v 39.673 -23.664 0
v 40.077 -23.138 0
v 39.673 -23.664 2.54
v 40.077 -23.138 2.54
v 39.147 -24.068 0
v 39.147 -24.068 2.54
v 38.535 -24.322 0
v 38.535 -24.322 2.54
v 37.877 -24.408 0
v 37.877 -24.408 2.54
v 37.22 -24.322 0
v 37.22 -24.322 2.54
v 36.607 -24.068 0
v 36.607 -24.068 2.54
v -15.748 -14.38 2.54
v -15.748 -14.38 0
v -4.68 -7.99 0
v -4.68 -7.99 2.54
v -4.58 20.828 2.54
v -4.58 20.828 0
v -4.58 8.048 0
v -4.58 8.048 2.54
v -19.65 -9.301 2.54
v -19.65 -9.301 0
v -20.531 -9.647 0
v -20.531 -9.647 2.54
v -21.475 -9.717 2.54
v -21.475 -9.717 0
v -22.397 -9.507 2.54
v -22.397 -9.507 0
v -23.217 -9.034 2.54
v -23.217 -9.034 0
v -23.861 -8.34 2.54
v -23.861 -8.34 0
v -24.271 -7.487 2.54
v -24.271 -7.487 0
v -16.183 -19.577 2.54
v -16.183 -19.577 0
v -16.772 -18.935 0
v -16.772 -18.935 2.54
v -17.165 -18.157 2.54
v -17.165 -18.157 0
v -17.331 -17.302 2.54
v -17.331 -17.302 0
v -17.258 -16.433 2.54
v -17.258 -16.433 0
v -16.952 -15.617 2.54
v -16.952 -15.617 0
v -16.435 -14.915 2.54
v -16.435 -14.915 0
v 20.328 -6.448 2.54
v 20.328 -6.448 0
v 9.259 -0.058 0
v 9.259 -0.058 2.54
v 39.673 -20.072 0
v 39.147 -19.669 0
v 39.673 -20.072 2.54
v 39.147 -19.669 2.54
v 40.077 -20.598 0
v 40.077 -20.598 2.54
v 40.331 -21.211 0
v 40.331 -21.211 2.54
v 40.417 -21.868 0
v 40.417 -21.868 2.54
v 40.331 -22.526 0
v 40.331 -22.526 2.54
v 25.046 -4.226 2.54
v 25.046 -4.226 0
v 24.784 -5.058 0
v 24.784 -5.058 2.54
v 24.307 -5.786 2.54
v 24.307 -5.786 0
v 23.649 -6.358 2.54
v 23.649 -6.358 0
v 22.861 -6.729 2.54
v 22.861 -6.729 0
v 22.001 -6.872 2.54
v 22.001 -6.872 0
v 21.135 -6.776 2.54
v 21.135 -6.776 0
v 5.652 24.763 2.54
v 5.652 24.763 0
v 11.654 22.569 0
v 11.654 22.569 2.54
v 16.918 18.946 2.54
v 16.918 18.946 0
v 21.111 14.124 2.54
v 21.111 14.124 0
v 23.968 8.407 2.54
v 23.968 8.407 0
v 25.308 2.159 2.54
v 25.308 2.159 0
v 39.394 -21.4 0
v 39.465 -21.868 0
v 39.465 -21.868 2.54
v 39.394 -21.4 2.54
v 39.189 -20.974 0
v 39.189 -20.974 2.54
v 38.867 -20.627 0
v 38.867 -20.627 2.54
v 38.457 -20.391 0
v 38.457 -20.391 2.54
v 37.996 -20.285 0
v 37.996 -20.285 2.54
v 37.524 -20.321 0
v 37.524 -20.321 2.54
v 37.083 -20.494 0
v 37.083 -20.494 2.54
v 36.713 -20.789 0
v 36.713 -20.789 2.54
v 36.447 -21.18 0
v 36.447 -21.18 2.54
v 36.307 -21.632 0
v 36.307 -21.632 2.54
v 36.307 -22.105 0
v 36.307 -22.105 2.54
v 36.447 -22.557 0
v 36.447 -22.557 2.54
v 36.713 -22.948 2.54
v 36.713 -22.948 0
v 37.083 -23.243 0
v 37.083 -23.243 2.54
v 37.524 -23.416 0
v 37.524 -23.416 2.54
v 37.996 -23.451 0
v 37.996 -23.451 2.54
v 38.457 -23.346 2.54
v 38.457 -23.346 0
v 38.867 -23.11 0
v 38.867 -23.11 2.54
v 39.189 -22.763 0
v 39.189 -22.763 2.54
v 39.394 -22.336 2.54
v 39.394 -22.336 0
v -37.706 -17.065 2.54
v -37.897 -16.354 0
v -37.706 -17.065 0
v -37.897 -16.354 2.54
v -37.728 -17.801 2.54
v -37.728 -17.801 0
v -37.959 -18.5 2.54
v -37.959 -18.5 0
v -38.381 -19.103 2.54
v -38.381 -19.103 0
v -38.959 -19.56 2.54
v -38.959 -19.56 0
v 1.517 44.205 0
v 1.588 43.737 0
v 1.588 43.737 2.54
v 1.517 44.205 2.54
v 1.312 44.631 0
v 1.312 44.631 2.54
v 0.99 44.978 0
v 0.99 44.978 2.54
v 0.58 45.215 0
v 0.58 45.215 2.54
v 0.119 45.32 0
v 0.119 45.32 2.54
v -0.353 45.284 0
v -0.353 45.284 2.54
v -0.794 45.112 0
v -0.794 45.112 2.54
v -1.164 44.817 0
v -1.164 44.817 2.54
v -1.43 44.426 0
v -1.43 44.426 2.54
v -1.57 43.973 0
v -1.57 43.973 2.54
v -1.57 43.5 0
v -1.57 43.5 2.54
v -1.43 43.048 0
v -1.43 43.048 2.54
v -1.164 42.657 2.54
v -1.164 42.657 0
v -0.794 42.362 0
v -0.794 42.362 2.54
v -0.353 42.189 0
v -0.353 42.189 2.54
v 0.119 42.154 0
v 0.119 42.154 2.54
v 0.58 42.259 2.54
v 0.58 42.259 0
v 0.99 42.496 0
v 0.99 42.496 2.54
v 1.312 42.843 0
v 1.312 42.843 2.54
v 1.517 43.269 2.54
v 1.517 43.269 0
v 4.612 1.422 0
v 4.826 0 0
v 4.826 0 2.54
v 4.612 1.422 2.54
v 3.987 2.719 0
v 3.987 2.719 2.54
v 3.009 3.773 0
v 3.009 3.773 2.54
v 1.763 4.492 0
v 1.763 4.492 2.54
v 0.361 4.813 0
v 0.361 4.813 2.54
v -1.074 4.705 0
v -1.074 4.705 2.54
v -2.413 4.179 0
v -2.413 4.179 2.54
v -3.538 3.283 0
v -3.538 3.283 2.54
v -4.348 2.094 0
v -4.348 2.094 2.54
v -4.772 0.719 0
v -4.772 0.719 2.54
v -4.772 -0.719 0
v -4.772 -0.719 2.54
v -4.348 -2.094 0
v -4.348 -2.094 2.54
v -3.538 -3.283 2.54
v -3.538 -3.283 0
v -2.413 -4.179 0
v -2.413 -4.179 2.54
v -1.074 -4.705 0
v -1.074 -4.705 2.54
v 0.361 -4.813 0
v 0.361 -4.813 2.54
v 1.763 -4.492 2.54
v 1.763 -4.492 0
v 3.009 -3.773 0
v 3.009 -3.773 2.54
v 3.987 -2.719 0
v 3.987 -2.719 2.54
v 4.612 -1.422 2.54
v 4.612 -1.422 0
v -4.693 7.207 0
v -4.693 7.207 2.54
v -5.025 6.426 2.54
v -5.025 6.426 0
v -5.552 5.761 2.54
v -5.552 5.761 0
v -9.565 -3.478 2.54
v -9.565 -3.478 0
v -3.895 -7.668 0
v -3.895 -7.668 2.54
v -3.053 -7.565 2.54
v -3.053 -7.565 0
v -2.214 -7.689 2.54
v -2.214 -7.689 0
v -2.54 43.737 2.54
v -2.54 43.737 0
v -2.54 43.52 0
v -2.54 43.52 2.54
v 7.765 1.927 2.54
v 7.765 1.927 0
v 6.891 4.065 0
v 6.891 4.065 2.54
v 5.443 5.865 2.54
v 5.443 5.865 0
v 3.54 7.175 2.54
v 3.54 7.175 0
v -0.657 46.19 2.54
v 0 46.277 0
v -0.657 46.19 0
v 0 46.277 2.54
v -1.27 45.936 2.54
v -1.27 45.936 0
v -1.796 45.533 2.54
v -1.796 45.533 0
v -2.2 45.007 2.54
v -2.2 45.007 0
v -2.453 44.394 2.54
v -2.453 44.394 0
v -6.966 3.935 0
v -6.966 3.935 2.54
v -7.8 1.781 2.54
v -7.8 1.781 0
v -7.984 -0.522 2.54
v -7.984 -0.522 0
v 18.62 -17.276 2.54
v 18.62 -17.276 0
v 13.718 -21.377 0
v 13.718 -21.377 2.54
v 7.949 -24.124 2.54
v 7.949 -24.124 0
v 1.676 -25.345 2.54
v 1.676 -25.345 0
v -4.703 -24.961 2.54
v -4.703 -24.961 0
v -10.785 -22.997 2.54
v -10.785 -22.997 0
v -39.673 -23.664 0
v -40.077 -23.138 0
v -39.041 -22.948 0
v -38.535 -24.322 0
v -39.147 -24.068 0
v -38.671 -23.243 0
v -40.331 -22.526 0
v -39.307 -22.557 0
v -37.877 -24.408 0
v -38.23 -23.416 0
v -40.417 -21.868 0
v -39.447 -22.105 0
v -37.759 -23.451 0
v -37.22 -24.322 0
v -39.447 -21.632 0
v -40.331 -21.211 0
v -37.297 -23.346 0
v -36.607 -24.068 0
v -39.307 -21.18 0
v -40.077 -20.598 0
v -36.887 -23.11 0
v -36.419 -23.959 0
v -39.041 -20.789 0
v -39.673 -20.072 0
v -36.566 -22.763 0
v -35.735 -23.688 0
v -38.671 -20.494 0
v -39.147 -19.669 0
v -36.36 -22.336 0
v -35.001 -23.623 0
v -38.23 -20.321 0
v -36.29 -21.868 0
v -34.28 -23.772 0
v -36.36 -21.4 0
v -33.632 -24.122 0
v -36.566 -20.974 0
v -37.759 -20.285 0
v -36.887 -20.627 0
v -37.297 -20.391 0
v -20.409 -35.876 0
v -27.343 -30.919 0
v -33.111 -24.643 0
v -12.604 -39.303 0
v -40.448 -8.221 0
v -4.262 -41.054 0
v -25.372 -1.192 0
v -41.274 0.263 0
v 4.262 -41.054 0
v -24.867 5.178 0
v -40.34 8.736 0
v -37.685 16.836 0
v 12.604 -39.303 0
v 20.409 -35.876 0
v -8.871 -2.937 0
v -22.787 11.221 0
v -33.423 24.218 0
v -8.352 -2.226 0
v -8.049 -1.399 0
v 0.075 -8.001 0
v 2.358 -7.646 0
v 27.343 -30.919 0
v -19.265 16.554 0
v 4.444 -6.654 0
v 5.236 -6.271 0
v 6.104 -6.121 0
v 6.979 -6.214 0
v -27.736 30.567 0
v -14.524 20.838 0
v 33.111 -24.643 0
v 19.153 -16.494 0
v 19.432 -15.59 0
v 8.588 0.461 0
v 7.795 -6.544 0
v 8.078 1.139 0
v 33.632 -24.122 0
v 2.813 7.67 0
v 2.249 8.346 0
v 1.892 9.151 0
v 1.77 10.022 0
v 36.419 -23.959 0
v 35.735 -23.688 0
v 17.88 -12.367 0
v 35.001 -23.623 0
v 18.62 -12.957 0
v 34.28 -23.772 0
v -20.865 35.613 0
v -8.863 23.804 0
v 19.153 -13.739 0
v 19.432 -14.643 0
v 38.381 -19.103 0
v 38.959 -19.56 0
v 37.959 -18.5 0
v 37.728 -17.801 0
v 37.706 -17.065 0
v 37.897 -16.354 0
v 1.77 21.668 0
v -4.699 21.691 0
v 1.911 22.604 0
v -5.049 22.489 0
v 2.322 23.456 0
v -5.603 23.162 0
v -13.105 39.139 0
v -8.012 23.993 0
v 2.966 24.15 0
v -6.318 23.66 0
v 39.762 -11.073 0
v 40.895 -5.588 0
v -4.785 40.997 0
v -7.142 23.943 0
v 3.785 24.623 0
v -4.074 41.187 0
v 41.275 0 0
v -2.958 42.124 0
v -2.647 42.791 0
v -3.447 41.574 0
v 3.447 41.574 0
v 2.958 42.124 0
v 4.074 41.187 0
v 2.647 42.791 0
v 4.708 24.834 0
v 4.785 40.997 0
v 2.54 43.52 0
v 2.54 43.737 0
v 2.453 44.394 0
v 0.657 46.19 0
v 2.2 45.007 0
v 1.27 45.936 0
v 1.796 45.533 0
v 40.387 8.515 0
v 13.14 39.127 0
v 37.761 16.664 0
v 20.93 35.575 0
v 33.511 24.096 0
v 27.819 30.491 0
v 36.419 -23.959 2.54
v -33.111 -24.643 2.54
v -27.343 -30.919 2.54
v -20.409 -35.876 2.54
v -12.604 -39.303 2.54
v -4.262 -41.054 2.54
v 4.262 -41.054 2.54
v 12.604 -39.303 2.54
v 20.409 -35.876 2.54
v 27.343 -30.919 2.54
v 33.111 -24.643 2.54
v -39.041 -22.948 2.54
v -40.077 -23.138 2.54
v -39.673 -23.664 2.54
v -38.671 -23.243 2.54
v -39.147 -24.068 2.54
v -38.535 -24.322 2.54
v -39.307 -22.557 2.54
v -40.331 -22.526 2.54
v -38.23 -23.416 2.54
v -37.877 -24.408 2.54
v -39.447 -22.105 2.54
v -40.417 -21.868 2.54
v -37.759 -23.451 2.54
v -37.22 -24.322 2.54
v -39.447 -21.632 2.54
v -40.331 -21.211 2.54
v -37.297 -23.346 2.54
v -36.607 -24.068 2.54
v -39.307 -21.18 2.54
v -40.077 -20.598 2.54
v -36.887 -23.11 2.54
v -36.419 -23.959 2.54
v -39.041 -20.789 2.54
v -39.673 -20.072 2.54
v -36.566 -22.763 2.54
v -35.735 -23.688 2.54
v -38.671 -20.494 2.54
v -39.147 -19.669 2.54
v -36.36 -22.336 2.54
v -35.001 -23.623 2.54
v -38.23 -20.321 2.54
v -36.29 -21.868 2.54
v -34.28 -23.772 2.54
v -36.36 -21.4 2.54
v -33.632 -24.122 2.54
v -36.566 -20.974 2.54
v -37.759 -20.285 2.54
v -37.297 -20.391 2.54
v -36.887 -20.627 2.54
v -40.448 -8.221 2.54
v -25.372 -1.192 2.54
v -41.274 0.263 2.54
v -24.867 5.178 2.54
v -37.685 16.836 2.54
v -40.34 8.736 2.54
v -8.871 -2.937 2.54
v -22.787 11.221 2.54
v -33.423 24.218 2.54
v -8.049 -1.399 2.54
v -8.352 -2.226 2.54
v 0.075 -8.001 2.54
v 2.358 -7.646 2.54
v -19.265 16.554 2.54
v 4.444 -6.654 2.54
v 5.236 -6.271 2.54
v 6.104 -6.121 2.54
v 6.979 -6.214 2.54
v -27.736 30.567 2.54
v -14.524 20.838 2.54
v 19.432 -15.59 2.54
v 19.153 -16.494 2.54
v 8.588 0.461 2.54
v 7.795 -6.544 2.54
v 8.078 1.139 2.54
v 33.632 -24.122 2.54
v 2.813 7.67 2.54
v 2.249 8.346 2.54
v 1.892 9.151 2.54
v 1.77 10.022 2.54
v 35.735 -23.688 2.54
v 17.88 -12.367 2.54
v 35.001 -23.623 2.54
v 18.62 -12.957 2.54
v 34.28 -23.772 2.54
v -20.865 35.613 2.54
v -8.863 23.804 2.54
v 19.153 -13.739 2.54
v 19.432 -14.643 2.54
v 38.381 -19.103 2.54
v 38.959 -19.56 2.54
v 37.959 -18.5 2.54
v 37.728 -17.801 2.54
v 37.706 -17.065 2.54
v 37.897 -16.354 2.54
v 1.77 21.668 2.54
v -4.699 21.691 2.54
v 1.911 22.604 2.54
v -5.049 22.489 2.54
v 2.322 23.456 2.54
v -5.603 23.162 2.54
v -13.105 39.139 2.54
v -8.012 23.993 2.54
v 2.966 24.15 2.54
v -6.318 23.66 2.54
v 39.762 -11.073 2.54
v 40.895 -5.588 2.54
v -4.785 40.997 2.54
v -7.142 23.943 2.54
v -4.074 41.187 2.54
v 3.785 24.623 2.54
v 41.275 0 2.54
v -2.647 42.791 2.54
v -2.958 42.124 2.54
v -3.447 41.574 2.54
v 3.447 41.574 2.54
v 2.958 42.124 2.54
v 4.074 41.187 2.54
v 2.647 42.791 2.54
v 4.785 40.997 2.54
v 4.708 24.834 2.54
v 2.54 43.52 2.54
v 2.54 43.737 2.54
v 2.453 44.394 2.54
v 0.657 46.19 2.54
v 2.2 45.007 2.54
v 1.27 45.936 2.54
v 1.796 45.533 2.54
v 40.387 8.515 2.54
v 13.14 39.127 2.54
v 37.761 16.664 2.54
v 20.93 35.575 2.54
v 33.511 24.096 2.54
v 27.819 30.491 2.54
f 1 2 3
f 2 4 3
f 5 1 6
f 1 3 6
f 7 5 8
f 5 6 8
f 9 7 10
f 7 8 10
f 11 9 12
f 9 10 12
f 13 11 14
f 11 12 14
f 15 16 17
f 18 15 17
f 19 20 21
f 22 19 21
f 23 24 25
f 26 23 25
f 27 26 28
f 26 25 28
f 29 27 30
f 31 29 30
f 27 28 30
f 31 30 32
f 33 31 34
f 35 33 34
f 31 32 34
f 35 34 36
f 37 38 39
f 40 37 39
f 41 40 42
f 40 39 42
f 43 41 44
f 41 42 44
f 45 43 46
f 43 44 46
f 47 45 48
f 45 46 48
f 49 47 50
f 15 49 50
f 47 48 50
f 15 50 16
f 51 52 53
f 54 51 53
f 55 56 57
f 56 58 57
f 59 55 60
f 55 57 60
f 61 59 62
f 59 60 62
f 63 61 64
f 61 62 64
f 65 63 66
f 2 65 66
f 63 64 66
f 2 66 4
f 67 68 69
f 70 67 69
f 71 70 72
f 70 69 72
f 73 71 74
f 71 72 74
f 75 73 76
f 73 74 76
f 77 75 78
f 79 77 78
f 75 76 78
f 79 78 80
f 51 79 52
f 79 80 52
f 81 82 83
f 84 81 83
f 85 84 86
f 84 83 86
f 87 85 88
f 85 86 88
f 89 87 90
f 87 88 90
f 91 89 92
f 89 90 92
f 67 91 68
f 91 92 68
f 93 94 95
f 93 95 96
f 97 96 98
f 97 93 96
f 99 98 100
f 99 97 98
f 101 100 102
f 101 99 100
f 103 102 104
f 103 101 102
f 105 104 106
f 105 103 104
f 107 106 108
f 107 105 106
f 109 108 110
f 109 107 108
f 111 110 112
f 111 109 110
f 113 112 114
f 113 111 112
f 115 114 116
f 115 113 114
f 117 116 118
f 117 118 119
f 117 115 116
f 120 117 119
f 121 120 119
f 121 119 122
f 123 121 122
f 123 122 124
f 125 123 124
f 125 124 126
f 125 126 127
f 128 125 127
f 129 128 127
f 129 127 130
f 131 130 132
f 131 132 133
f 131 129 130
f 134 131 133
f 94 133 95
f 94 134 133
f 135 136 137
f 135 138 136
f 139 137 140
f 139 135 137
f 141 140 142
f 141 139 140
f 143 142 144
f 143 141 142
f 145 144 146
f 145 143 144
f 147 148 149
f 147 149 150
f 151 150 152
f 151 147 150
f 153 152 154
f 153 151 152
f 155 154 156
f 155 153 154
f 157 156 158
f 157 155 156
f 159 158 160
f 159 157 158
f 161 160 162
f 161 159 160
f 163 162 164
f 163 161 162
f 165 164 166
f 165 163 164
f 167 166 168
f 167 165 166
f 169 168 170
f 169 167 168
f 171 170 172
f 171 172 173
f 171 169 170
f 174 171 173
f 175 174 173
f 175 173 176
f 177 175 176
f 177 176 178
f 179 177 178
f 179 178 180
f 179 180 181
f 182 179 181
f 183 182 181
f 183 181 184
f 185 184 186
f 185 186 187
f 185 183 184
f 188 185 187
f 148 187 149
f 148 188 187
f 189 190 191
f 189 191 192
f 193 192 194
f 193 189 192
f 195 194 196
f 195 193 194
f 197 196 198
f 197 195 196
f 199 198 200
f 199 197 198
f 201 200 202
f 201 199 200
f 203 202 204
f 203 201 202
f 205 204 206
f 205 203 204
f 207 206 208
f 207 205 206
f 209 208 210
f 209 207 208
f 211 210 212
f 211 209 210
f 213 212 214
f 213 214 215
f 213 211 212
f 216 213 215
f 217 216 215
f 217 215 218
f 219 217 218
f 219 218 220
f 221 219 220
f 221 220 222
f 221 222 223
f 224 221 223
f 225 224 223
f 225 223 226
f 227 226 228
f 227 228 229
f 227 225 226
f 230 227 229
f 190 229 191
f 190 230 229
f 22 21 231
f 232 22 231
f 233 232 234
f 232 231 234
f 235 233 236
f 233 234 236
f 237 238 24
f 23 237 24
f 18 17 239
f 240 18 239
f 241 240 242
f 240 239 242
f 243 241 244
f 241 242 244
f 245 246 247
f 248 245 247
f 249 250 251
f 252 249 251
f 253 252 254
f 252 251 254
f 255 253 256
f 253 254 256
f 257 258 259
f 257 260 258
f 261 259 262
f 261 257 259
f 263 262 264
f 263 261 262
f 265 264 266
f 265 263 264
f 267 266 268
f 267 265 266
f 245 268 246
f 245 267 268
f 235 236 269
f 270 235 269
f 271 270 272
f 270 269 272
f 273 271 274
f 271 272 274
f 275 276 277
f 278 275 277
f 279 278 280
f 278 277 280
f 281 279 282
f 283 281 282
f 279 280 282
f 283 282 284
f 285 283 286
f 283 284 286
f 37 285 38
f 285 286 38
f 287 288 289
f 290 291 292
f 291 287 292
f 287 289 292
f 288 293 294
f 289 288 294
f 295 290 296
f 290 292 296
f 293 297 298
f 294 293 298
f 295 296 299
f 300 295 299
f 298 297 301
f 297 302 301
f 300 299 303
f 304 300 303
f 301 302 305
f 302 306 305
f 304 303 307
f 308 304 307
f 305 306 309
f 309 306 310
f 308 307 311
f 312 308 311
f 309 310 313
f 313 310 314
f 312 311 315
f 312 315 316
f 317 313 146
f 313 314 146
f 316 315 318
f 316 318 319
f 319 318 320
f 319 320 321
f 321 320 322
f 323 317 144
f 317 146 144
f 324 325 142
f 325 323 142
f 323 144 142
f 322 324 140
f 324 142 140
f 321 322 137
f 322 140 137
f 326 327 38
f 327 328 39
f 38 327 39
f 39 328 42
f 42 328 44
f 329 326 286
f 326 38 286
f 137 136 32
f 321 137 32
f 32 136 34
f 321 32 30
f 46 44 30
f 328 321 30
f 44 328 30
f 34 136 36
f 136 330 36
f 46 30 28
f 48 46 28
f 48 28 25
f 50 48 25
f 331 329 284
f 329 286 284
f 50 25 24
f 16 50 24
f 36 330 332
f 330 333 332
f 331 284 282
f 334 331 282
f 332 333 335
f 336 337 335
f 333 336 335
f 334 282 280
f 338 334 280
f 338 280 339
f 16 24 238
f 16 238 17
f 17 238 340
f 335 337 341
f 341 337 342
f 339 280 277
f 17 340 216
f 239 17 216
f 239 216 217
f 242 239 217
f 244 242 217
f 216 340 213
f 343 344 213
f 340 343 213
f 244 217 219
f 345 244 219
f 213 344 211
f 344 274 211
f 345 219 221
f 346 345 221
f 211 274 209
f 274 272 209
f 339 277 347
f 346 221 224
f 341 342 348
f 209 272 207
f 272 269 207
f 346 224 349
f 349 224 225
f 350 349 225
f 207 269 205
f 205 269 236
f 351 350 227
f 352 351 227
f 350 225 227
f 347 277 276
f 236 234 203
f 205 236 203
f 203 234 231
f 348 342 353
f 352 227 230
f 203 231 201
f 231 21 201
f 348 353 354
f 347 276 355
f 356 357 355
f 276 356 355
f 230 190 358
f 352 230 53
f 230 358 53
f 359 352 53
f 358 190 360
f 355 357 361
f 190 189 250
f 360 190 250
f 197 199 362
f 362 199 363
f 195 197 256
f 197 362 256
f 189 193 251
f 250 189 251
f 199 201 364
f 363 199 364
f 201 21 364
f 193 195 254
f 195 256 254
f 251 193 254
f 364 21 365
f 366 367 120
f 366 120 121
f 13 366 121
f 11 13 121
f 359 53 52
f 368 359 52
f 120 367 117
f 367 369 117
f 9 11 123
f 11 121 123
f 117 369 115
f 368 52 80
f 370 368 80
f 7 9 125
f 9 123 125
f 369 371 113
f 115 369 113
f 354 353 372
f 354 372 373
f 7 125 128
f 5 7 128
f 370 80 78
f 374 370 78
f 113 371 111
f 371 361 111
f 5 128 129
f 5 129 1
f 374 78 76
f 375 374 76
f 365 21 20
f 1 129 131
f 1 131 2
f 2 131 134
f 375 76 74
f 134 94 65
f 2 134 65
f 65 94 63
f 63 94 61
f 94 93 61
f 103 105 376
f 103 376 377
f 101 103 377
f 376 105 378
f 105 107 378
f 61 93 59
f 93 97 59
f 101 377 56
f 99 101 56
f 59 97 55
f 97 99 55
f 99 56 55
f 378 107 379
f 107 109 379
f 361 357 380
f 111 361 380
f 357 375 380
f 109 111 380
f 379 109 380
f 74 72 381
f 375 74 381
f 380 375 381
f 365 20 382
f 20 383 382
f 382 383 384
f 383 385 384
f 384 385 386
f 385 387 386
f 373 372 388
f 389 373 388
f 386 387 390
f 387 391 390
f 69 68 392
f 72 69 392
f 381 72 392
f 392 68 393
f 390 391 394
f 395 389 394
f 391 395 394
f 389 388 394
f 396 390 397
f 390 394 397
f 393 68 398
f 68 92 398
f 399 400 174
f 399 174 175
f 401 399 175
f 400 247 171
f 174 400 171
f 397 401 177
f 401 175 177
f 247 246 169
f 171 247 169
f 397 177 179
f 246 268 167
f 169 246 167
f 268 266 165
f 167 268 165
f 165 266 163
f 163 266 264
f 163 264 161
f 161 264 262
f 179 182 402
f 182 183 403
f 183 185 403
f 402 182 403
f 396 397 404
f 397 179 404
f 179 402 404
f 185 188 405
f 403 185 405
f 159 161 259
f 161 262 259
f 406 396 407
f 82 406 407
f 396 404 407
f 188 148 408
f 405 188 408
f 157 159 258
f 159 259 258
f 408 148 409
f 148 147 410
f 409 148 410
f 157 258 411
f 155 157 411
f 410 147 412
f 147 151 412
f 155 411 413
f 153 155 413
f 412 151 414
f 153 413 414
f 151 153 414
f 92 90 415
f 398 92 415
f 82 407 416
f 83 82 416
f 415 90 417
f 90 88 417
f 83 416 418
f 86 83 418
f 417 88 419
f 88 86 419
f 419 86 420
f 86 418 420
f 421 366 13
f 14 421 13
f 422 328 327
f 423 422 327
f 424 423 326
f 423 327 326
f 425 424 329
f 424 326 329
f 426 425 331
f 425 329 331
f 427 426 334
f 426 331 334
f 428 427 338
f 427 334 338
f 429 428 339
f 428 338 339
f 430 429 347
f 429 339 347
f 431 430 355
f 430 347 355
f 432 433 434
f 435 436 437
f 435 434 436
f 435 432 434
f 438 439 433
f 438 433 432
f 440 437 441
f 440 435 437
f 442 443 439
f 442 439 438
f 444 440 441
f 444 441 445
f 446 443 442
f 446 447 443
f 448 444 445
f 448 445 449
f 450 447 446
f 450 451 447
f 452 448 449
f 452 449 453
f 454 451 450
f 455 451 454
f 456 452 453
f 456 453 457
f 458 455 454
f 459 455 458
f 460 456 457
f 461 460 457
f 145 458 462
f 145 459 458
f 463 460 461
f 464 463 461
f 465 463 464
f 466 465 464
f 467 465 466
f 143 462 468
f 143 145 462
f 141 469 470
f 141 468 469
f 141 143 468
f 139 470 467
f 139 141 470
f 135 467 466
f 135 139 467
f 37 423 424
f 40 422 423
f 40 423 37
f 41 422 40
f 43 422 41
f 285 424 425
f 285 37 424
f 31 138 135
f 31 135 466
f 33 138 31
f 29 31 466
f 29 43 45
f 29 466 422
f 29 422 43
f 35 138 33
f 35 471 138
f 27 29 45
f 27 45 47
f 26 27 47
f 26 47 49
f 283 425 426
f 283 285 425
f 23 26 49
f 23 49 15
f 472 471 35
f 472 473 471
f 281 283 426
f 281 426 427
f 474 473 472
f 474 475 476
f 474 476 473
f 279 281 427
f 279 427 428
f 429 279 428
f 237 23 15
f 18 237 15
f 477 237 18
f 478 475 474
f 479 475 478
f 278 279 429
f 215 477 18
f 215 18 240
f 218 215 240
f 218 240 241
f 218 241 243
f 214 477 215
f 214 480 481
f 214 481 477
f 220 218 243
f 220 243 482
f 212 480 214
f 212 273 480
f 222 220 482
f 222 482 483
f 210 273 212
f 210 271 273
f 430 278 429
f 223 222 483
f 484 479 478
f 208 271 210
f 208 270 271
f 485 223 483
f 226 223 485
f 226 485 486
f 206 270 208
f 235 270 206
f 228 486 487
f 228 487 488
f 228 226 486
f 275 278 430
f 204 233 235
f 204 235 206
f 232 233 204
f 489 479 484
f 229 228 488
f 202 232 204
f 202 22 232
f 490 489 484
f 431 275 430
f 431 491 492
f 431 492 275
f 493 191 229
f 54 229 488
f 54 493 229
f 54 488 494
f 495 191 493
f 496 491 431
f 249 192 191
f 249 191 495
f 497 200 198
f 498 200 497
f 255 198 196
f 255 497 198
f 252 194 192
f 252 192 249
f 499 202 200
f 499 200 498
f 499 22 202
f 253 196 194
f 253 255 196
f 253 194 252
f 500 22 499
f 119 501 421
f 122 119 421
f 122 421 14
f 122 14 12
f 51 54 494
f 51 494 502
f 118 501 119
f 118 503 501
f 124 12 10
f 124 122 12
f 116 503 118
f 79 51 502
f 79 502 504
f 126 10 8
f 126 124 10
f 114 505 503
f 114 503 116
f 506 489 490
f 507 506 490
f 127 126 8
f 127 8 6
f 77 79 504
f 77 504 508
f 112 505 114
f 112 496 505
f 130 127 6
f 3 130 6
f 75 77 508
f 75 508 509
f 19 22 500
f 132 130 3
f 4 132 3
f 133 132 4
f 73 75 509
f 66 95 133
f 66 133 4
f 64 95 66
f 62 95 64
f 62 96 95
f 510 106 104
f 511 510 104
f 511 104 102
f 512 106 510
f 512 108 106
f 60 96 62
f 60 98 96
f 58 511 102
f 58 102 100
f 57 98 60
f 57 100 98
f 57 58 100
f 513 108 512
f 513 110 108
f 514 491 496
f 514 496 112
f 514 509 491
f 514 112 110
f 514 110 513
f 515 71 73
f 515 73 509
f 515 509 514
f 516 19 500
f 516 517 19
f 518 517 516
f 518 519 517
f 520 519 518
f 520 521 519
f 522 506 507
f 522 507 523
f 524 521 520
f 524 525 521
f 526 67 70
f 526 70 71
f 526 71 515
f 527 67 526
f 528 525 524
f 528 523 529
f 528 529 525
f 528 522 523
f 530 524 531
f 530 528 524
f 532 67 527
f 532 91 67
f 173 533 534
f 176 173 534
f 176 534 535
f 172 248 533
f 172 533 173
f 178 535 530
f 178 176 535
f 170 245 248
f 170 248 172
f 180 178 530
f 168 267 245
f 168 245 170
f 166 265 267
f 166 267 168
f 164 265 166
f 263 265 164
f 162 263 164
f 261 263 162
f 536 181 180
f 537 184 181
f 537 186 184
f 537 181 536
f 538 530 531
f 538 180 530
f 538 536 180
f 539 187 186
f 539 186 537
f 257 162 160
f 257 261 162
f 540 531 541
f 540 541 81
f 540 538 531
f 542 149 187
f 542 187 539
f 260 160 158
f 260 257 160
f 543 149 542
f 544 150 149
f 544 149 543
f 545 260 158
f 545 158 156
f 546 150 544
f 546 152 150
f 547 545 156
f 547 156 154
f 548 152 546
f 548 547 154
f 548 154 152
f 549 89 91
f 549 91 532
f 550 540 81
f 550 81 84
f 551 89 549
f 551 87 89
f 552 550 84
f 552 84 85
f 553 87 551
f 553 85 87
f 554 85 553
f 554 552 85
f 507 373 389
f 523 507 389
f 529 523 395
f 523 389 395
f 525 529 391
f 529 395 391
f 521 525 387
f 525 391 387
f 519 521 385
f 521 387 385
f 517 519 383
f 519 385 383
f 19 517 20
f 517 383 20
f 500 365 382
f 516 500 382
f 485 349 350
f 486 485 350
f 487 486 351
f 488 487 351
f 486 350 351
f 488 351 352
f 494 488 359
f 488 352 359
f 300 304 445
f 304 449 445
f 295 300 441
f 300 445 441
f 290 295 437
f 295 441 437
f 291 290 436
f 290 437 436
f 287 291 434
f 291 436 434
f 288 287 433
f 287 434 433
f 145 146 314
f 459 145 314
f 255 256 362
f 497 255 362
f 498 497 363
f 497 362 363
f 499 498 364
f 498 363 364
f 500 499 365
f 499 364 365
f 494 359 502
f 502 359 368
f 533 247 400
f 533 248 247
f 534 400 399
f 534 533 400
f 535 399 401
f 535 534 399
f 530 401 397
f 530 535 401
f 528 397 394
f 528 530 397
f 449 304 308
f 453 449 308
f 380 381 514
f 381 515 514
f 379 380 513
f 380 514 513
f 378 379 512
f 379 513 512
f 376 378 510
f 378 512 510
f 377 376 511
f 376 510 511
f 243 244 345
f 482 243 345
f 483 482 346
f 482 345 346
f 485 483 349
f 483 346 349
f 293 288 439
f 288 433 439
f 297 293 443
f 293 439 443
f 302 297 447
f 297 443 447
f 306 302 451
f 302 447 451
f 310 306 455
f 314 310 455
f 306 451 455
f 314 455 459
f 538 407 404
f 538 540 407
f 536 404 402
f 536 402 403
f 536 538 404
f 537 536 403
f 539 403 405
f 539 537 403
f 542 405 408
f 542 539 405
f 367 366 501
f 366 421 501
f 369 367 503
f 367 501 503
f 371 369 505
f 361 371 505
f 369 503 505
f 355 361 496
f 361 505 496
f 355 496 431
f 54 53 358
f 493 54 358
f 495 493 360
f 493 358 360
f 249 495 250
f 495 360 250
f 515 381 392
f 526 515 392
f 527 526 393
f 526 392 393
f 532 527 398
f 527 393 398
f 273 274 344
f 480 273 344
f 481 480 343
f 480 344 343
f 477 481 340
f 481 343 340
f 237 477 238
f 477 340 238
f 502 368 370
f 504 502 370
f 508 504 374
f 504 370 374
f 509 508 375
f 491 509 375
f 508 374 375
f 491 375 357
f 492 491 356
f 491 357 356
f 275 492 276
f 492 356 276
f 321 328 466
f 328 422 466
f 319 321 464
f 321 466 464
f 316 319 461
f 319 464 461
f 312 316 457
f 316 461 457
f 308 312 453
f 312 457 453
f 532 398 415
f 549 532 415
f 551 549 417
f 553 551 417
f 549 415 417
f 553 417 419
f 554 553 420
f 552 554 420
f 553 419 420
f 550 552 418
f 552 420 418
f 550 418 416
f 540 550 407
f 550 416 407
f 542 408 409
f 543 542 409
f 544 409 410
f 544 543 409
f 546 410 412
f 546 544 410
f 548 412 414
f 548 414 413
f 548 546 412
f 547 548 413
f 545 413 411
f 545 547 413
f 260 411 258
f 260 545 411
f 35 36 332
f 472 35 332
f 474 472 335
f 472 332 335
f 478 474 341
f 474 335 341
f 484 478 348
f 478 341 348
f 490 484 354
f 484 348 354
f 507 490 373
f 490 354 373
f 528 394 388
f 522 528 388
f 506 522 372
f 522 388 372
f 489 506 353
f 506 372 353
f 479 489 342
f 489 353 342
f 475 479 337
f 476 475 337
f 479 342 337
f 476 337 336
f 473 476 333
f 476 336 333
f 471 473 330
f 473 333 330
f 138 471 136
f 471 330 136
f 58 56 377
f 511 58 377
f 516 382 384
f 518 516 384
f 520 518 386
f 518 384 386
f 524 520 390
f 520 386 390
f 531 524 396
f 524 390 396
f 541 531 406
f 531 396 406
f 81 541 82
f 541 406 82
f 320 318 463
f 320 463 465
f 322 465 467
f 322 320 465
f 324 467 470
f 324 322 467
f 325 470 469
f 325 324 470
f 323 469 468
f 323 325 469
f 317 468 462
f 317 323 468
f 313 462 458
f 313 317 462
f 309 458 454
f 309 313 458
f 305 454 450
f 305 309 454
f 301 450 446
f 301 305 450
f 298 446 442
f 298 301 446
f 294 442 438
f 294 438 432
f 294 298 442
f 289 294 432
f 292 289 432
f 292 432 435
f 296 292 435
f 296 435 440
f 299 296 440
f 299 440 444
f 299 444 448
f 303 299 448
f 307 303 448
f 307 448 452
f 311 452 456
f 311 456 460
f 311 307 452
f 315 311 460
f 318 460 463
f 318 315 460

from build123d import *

# Parameters (mm, degrees)
F0_R     = 4.826
F0_R_2   = 1.5875
F1_DEPTH = 2.54
F2_R     = 2.53999


# Not quite as in the source:
# - a fillet or chamfer is up to 0.001 mm smaller than in the source, because OpenCascade refuses the exact size


with BuildPart() as f1:
    # F0 (on Top) → F1 (new body)
    with BuildSketch(Plane.XY):
        with BuildLine():
            ThreePointArc((36.9474511246, -18.3986814852), (40.1785494398, -9.4503857019), (41.275, 0))
            ThreePointArc((41.275, 0), (30.0704516511, 28.2735488133), (2.54, 41.1967720216))
            ThreePointArc((2.54, 41.1967720216), (0, 41.275), (-2.54, 41.1967720216))
            ThreePointArc((-2.54, 41.1967720216), (-35.7451985412, 20.6375), (-36.9474511246, -18.3986814852))
            ThreePointArc((-36.9474511246, -18.3986814852), (-35.7451985412, -20.6375), (-34.4074511246, -22.7980905364))
            ThreePointArc((-34.4074511246, -22.7980905364), (0, -41.275), (34.4074511246, -22.7980905364))
            ThreePointArc((34.4074511246, -22.7980905364), (35.7451985412, -20.6375), (36.9474511246, -18.3986814852))
        make_face()
        with BuildLine():
            ThreePointArc((-16.1831892187, -19.5771393904), (-17.3242054231, -16.864916263), (-15.7477905664, -14.3803663096))
            Line((-15.7477905664, -14.3803663096), (-4.6795539693, -7.9901169308))
            ThreePointArc((-4.6795539693, -7.9901169308), (-3.4772976031, -7.5882063232), (-2.2136295462, -7.6886829322))
            ThreePointArc((-2.2136295462, -7.6886829322), (1.2293114508, -7.9059973664), (4.4437139688, -6.6535259196))
            ThreePointArc((4.4437139688, -6.6535259196), (6.1035441451, -6.1205029783), (7.7945925279, -6.544183326))
            Line((7.7945925279, -6.544183326), (17.8798534353, -12.3669114257))
            ThreePointArc((17.8798534353, -12.3669114257), (19.431886995, -14.6433042701), (18.6198324975, -17.2760480945))
            ThreePointArc((18.6198324975, -17.2760480945), (1.6757275748, -25.3446628917), (-16.1831892187, -19.5771393904))
        make_face(mode=Mode.SUBTRACT)
        Circle(F0_R, mode=Mode.SUBTRACT)
        with BuildLine():
            ThreePointArc((-24.2714127756, -7.4872239098), (-22.786985702, 11.2211087963), (-8.8627054362, 23.8036226729))
            ThreePointArc((-8.8627054362, 23.8036226729), (-5.9433432049, 23.4356601283), (-4.5798672566, 20.8281698388))
            Line((-4.5798672566, 20.8281698388), (-4.5798672566, 8.0476710812))
            ThreePointArc((-4.5798672566, 8.0476710812), (-4.8329306435, 6.8055312224), (-5.5517799678, 5.7614008877))
            ThreePointArc((-5.5517799678, 5.7614008877), (-7.4614502869, 2.8883837376), (-7.9839794556, -0.5216062243))
            ThreePointArc((-7.9839794556, -0.5216062243), (-8.3522831357, -2.2255727936), (-9.5647252713, -3.4782234783))
            Line((-9.5647252713, -3.4782234783), (-19.6499861787, -9.3009515781))
            ThreePointArc((-19.6499861787, -9.3009515781), (-22.3974169907, -9.5068556461), (-24.2714127756, -7.4872239098))
        make_face(mode=Mode.SUBTRACT)
        with BuildLine():
            Line((1.7701327434, 10.0224068043), (1.7701327434, 21.6678630038))
            ThreePointArc((1.7701327434, 21.6678630038), (2.9655299957, 24.1501599162), (5.6515802781, 24.7632720043))
            ThreePointArc((5.6515802781, 24.7632720043), (21.1112581272, 14.1235540955), (25.0458946549, -4.2264832825))
            ThreePointArc((25.0458946549, -4.2264832825), (23.267548628, -6.5707438653), (20.327657823, -6.4478035292))
            Line((20.327657823, -6.4478035292), (9.259421226, -0.0575541504))
            ThreePointArc((9.259421226, -0.0575541504), (8.3102282466, 0.7826751008), (7.7654095141, 1.9272820445))
            ThreePointArc((7.7654095141, 1.9272820445), (6.2321388361, 5.0176136288), (3.5402654867, 7.175132144))
            ThreePointArc((3.5402654867, 7.175132144), (2.2487389906, 8.3460757719), (1.7701327434, 10.0224068043))
        make_face(mode=Mode.SUBTRACT)
        with BuildLine():
            ThreePointArc((-2.54, 41.1967720216), (0, 41.275), (2.54, 41.1967720216))
            Line((2.54, 41.1967720216), (2.54, 46.2767720216))
            Line((2.54, 46.2767720216), (-2.54, 46.2767720216))
            Line((-2.54, 46.2767720216), (-2.54, 41.1967720216))
        make_face()
        with Locations((0, 43.7367720216)):
            Circle(F0_R_2, mode=Mode.SUBTRACT)
        with BuildLine():
            ThreePointArc((-34.4074511246, -22.7980905364), (-35.7451985412, -20.6375), (-36.9474511246, -18.3986814852))
            Line((-36.9474511246, -18.3986814852), (-41.3468601758, -20.9386814852))
            Line((-41.3468601758, -20.9386814852), (-38.8068601758, -25.3380905364))
            Line((-38.8068601758, -25.3380905364), (-34.4074511246, -22.7980905364))
        make_face()
        with Locations((-37.8771556502, -21.8683860108)):
            Circle(F0_R_2, mode=Mode.SUBTRACT)
        with BuildLine():
            Line((41.3468601758, -20.9386814852), (36.9474511246, -18.3986814852))
            ThreePointArc((36.9474511246, -18.3986814852), (35.7451985412, -20.6375), (34.4074511246, -22.7980905364))
            Line((34.4074511246, -22.7980905364), (38.8068601758, -25.3380905364))
            Line((38.8068601758, -25.3380905364), (41.3468601758, -20.9386814852))
        make_face()
        with Locations((37.8771556502, -21.8683860108)):
            Circle(F0_R_2, mode=Mode.SUBTRACT)
    extrude(amount=F1_DEPTH)

    # F2 (radius 2.54 in the source; OpenCascade refuses exactly that, so slightly less here)
    f2_edges = [f1.edges().sort_by_distance(p)[0] for p in [
        (-34.407451, -22.798091, 1.27),
        (-38.80686, -25.338091, 1.27),
        (-41.34686, -20.938681, 1.27),
        (-36.947451, -18.398681, 1.27),
        (34.407451, -22.798091, 1.27),
        (38.80686, -25.338091, 1.27),
        (41.34686, -20.938681, 1.27),
        (36.947451, -18.398681, 1.27),
        (2.54, 41.196772, 1.27),
        (2.54, 46.276772, 1.27),
        (-2.54, 41.196772, 1.27),
        (-2.54, 46.276772, 1.27),
    ]]
    fillet(f2_edges, radius=F2_R)


solid = f1.part
